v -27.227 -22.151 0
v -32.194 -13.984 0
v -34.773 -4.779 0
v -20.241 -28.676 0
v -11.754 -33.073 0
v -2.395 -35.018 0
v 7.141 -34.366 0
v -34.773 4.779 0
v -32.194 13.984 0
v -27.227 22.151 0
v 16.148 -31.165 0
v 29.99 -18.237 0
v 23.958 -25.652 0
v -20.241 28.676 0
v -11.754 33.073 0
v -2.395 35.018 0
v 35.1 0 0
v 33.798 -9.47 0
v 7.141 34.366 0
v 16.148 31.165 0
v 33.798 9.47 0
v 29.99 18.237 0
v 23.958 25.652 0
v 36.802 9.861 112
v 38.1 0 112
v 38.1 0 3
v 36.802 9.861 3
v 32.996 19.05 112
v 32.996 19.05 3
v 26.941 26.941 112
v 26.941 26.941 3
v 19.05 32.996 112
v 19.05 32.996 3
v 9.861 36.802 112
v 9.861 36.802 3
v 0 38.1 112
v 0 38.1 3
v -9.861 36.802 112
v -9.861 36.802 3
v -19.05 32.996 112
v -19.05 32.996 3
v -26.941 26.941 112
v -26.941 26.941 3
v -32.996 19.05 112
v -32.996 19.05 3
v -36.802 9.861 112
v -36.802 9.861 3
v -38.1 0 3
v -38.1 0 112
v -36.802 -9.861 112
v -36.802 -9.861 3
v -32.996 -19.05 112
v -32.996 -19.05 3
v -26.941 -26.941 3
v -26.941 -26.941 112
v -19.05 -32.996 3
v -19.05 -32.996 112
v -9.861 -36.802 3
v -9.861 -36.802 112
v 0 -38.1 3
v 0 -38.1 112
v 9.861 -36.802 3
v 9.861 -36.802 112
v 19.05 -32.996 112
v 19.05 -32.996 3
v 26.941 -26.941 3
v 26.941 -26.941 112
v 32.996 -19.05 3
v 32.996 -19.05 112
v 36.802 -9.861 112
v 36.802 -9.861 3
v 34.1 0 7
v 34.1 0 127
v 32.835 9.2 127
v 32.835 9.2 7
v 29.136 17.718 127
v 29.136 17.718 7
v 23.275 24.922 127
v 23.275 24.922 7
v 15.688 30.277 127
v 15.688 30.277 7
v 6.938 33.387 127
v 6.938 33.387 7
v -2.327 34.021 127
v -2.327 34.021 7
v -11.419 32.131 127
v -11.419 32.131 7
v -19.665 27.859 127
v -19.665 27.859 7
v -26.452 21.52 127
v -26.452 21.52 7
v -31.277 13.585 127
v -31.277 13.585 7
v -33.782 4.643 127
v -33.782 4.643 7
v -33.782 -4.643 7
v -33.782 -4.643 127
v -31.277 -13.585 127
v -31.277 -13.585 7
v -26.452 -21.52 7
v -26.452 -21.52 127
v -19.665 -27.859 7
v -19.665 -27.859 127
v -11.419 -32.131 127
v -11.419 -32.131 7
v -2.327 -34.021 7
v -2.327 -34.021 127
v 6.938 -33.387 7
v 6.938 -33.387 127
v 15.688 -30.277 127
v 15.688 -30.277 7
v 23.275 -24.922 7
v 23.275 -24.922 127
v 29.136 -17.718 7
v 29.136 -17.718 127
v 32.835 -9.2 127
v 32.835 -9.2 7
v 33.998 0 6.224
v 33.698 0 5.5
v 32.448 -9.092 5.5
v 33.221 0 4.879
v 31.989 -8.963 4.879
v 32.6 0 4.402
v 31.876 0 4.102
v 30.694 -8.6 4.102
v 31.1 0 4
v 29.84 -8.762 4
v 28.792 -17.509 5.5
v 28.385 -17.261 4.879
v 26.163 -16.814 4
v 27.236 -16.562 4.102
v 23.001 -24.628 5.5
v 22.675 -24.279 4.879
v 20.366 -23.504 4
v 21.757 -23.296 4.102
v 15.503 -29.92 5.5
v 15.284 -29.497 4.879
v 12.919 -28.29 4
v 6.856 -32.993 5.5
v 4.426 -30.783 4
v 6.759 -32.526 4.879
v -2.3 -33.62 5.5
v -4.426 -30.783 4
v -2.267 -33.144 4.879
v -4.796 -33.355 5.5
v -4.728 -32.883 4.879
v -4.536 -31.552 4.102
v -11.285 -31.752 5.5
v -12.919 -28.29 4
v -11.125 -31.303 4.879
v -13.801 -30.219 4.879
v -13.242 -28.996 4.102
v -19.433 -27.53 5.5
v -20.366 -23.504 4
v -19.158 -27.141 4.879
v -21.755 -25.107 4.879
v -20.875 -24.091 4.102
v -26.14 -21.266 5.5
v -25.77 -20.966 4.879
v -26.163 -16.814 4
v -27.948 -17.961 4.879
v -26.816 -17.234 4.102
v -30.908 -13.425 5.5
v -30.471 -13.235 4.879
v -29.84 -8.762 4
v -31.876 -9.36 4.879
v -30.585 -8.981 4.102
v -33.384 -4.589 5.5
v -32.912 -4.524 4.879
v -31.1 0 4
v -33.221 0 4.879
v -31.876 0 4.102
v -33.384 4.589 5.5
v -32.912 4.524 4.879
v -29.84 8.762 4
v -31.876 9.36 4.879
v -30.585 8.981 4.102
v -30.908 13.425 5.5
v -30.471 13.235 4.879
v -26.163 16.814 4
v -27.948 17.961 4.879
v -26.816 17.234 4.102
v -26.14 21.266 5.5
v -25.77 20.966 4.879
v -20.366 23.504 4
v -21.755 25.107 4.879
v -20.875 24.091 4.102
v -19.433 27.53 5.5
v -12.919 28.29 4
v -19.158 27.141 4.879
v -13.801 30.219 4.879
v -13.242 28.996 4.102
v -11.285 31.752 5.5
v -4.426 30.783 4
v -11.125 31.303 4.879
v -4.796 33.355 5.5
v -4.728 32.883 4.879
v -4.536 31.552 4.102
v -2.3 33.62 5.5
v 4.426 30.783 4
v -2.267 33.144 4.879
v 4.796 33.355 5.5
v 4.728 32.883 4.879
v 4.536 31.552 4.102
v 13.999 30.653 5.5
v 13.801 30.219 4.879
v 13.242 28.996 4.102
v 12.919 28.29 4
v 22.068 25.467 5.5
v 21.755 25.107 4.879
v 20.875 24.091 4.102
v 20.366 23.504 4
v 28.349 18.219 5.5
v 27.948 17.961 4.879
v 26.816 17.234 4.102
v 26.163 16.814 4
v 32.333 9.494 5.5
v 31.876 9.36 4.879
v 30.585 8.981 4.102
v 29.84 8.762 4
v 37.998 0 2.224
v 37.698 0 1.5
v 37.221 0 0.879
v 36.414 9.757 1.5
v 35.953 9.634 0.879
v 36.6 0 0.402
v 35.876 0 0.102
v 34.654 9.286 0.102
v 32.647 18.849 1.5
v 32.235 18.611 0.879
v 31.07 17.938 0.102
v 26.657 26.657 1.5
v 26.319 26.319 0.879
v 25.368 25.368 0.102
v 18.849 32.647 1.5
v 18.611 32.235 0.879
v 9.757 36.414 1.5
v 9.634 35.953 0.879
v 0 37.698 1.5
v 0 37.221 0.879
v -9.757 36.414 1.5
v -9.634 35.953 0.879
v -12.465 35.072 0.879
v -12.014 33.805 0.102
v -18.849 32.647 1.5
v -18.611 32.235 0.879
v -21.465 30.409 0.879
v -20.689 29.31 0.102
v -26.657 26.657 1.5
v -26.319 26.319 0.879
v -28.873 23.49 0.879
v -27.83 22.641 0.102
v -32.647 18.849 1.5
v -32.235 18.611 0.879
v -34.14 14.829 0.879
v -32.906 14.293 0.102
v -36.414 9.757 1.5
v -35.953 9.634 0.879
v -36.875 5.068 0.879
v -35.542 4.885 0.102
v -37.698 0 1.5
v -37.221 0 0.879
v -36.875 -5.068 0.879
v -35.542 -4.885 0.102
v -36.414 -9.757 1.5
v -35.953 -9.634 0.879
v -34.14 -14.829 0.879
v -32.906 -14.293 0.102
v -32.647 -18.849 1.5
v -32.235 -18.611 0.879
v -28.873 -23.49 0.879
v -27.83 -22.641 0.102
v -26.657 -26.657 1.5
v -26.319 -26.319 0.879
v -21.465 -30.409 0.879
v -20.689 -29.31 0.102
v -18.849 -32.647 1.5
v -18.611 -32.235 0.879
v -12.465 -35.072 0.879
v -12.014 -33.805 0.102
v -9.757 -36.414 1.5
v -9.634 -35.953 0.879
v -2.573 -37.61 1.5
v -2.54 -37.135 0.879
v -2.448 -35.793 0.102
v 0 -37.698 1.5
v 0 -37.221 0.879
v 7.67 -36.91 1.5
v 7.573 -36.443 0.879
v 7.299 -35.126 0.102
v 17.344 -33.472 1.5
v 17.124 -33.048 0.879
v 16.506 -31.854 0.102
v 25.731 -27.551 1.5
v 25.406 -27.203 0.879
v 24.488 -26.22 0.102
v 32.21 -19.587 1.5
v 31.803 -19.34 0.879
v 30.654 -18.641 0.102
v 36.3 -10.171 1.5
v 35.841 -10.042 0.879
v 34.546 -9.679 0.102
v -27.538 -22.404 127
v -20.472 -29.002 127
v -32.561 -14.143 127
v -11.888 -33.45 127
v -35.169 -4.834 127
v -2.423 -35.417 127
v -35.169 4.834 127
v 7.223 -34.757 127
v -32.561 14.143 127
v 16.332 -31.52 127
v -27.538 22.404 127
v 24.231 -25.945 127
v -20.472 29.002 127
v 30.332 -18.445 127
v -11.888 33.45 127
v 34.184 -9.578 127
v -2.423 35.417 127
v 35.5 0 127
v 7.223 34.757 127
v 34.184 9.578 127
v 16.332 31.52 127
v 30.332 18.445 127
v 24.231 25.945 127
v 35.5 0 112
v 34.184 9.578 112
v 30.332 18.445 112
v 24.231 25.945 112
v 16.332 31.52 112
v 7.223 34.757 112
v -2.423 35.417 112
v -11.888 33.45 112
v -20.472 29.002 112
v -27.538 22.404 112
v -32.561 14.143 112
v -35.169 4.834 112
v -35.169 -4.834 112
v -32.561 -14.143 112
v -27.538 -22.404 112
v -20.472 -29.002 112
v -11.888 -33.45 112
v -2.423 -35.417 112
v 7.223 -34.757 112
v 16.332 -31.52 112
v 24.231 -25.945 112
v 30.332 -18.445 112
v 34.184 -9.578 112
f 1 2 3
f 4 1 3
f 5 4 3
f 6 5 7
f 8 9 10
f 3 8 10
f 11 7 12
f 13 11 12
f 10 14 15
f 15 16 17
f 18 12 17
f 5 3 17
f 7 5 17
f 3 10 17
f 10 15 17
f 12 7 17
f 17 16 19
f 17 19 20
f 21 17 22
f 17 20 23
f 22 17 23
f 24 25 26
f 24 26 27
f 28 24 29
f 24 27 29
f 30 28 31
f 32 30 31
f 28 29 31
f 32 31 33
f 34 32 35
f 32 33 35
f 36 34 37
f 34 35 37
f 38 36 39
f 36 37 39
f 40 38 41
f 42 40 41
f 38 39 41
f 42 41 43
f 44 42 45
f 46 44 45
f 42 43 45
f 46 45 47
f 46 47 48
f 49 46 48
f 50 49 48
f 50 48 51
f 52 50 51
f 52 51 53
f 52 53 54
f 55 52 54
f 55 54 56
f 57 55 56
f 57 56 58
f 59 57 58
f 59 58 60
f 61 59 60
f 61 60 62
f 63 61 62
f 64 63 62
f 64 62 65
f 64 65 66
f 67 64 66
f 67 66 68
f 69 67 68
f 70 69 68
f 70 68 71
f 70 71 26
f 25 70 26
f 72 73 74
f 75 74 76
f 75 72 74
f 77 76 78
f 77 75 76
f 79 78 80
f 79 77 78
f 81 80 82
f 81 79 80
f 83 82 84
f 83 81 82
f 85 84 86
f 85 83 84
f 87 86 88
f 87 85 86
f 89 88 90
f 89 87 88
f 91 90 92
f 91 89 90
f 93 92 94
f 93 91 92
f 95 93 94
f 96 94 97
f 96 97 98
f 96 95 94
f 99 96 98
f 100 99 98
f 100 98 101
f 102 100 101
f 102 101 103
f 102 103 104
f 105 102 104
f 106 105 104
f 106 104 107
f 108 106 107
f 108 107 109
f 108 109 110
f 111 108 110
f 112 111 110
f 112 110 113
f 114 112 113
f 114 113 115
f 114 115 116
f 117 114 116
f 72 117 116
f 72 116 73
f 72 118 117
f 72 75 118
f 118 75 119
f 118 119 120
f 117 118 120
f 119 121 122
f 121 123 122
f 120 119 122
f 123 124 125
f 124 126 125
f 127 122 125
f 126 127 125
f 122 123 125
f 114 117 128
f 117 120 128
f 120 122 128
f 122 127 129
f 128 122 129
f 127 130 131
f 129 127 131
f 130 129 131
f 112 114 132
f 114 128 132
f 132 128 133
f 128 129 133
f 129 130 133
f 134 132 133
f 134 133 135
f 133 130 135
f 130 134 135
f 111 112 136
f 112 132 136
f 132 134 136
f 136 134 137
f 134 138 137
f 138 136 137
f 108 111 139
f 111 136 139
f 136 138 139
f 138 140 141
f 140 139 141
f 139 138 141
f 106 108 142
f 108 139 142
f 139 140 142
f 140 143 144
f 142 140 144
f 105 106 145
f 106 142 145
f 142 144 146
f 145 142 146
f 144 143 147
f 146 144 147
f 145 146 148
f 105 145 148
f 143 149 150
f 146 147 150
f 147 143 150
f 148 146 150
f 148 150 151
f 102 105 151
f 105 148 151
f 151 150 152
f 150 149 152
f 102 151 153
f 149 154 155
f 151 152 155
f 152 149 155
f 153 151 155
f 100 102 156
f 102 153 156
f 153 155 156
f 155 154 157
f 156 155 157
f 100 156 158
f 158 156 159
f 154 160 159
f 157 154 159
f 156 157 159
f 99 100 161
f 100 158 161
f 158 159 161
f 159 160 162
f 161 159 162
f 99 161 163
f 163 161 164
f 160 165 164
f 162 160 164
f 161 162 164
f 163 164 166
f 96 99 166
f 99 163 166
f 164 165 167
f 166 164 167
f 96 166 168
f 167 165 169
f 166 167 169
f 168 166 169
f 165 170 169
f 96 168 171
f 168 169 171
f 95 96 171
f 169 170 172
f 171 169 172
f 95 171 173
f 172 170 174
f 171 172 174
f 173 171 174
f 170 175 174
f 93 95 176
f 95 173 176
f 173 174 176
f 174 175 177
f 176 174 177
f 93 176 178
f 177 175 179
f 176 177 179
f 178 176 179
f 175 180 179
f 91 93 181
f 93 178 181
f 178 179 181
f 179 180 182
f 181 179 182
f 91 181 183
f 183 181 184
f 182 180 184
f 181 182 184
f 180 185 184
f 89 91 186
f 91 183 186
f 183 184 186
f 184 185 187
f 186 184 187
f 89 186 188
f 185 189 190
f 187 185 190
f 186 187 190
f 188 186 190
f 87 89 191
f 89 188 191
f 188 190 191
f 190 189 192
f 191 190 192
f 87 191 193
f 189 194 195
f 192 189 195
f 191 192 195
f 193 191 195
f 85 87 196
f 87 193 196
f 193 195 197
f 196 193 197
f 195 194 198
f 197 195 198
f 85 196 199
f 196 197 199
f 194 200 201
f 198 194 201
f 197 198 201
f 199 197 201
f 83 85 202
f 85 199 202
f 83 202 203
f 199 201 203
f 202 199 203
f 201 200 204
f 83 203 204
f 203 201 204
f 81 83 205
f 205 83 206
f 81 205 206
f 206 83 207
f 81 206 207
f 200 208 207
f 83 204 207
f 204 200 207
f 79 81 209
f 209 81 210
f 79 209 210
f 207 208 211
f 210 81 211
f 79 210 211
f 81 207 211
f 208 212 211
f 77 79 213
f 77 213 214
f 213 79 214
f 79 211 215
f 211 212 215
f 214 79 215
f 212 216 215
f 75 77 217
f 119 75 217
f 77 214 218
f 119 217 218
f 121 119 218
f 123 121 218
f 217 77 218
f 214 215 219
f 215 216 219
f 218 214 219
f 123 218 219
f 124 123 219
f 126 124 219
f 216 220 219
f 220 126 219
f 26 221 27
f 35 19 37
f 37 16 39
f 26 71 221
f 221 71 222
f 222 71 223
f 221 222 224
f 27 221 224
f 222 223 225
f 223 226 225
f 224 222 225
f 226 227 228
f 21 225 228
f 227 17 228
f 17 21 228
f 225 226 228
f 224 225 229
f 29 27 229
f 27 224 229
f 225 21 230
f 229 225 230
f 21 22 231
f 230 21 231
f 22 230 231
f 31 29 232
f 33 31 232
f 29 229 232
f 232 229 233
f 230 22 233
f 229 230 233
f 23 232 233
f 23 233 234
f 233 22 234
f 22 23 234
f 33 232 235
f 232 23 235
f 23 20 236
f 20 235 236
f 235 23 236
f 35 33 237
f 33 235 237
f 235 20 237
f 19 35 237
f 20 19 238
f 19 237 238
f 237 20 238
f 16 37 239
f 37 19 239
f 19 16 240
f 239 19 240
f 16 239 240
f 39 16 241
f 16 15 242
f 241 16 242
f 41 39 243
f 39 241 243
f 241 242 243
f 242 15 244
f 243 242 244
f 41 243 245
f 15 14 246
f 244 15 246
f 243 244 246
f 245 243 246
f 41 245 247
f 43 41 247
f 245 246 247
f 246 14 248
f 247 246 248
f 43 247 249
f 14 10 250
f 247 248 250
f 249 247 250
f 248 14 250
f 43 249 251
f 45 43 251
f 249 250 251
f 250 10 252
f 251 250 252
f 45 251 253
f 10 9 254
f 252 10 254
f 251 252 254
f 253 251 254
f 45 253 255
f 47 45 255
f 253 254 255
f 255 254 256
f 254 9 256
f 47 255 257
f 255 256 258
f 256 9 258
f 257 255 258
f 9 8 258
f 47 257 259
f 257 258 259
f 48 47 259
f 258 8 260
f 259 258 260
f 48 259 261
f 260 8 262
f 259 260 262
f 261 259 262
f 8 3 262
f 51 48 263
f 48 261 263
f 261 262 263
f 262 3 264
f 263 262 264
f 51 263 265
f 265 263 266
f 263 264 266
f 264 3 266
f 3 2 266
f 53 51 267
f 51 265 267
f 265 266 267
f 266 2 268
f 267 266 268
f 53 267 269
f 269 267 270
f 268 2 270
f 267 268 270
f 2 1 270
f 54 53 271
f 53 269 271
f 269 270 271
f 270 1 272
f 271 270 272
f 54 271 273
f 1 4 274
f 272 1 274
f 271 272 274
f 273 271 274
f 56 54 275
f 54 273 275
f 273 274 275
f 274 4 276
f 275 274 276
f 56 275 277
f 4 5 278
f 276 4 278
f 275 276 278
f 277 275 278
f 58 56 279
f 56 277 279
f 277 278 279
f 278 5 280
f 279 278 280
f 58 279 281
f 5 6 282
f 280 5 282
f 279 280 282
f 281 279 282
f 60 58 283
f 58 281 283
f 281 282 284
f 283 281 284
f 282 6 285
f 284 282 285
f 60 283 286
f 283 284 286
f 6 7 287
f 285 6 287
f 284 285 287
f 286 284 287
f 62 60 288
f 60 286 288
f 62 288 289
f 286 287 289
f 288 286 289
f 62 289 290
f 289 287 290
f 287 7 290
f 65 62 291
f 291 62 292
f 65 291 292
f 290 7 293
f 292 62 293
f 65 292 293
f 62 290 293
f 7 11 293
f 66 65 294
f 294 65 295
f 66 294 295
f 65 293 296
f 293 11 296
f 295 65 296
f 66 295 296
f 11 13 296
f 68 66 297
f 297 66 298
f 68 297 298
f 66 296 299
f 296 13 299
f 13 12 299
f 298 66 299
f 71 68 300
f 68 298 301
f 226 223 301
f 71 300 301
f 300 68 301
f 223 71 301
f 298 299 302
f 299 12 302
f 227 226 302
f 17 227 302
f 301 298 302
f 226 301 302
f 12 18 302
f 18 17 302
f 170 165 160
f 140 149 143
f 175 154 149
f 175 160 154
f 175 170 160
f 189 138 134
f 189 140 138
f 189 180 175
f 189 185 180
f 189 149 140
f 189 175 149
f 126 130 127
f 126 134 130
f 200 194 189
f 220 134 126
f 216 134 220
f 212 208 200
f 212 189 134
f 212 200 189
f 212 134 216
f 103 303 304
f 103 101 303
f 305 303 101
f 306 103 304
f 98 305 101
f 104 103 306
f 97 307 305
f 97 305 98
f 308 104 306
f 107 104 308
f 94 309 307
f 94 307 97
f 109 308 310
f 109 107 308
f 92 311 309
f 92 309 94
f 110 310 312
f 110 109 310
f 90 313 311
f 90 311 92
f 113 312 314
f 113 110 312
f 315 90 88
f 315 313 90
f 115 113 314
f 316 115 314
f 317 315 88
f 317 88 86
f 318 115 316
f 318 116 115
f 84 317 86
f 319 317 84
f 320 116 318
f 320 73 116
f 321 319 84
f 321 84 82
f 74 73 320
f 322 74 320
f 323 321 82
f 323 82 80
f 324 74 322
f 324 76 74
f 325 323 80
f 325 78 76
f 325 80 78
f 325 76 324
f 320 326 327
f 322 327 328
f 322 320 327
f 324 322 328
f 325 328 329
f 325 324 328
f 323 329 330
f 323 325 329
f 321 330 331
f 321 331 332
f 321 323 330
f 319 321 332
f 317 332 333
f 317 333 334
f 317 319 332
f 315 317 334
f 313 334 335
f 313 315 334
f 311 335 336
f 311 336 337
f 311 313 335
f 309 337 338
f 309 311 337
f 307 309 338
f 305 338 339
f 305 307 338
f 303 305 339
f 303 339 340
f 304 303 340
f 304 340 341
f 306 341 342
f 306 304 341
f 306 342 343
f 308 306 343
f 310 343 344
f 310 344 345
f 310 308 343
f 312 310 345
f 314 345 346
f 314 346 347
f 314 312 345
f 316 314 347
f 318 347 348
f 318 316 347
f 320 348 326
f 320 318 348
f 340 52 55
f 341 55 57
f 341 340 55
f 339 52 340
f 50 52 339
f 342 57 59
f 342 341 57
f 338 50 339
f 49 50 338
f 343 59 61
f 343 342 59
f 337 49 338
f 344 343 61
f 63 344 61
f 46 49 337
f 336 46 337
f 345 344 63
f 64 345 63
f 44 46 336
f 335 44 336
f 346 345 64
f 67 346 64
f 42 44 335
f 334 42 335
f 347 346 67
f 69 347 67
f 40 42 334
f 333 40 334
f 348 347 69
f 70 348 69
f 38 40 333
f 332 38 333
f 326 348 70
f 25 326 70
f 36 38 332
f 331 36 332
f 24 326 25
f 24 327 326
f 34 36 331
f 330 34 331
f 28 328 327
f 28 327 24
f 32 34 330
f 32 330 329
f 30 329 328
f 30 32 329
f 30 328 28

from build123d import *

# Parameters (mm, degrees)
F0_R     = 38.1
F1_DEPTH = 127
F2_T     = -4
F3_R     = 38.1
F3_R_2   = 35.5
F4_DEPTH = 15
F5_R     = 3


with BuildPart() as f1:
    # F0 (on Top) → F1 (new body)
    with BuildSketch(Plane.XY):
        Circle(F0_R)
    extrude(amount=F1_DEPTH)

    # F2
    f2_openings = [f1.faces().sort_by_distance(p)[0] for p in [
        (0, 0, 127),
    ]]
    offset(amount=F2_T, openings=f2_openings)

    # F3 (on face) → F4 (cut)
    with BuildSketch(Plane.XY.offset(127)):
        Circle(F3_R)
        Circle(F3_R_2, mode=Mode.SUBTRACT)
    extrude(amount=-F4_DEPTH, mode=Mode.SUBTRACT)

    # F5
    f5_edges = [f1.edges().sort_by_distance(p)[0] for p in [
        (-38.1, 0, 0),
        (-34.1, 0, 4),
    ]]
    fillet(f5_edges, radius=F5_R)


solid = f1.part
